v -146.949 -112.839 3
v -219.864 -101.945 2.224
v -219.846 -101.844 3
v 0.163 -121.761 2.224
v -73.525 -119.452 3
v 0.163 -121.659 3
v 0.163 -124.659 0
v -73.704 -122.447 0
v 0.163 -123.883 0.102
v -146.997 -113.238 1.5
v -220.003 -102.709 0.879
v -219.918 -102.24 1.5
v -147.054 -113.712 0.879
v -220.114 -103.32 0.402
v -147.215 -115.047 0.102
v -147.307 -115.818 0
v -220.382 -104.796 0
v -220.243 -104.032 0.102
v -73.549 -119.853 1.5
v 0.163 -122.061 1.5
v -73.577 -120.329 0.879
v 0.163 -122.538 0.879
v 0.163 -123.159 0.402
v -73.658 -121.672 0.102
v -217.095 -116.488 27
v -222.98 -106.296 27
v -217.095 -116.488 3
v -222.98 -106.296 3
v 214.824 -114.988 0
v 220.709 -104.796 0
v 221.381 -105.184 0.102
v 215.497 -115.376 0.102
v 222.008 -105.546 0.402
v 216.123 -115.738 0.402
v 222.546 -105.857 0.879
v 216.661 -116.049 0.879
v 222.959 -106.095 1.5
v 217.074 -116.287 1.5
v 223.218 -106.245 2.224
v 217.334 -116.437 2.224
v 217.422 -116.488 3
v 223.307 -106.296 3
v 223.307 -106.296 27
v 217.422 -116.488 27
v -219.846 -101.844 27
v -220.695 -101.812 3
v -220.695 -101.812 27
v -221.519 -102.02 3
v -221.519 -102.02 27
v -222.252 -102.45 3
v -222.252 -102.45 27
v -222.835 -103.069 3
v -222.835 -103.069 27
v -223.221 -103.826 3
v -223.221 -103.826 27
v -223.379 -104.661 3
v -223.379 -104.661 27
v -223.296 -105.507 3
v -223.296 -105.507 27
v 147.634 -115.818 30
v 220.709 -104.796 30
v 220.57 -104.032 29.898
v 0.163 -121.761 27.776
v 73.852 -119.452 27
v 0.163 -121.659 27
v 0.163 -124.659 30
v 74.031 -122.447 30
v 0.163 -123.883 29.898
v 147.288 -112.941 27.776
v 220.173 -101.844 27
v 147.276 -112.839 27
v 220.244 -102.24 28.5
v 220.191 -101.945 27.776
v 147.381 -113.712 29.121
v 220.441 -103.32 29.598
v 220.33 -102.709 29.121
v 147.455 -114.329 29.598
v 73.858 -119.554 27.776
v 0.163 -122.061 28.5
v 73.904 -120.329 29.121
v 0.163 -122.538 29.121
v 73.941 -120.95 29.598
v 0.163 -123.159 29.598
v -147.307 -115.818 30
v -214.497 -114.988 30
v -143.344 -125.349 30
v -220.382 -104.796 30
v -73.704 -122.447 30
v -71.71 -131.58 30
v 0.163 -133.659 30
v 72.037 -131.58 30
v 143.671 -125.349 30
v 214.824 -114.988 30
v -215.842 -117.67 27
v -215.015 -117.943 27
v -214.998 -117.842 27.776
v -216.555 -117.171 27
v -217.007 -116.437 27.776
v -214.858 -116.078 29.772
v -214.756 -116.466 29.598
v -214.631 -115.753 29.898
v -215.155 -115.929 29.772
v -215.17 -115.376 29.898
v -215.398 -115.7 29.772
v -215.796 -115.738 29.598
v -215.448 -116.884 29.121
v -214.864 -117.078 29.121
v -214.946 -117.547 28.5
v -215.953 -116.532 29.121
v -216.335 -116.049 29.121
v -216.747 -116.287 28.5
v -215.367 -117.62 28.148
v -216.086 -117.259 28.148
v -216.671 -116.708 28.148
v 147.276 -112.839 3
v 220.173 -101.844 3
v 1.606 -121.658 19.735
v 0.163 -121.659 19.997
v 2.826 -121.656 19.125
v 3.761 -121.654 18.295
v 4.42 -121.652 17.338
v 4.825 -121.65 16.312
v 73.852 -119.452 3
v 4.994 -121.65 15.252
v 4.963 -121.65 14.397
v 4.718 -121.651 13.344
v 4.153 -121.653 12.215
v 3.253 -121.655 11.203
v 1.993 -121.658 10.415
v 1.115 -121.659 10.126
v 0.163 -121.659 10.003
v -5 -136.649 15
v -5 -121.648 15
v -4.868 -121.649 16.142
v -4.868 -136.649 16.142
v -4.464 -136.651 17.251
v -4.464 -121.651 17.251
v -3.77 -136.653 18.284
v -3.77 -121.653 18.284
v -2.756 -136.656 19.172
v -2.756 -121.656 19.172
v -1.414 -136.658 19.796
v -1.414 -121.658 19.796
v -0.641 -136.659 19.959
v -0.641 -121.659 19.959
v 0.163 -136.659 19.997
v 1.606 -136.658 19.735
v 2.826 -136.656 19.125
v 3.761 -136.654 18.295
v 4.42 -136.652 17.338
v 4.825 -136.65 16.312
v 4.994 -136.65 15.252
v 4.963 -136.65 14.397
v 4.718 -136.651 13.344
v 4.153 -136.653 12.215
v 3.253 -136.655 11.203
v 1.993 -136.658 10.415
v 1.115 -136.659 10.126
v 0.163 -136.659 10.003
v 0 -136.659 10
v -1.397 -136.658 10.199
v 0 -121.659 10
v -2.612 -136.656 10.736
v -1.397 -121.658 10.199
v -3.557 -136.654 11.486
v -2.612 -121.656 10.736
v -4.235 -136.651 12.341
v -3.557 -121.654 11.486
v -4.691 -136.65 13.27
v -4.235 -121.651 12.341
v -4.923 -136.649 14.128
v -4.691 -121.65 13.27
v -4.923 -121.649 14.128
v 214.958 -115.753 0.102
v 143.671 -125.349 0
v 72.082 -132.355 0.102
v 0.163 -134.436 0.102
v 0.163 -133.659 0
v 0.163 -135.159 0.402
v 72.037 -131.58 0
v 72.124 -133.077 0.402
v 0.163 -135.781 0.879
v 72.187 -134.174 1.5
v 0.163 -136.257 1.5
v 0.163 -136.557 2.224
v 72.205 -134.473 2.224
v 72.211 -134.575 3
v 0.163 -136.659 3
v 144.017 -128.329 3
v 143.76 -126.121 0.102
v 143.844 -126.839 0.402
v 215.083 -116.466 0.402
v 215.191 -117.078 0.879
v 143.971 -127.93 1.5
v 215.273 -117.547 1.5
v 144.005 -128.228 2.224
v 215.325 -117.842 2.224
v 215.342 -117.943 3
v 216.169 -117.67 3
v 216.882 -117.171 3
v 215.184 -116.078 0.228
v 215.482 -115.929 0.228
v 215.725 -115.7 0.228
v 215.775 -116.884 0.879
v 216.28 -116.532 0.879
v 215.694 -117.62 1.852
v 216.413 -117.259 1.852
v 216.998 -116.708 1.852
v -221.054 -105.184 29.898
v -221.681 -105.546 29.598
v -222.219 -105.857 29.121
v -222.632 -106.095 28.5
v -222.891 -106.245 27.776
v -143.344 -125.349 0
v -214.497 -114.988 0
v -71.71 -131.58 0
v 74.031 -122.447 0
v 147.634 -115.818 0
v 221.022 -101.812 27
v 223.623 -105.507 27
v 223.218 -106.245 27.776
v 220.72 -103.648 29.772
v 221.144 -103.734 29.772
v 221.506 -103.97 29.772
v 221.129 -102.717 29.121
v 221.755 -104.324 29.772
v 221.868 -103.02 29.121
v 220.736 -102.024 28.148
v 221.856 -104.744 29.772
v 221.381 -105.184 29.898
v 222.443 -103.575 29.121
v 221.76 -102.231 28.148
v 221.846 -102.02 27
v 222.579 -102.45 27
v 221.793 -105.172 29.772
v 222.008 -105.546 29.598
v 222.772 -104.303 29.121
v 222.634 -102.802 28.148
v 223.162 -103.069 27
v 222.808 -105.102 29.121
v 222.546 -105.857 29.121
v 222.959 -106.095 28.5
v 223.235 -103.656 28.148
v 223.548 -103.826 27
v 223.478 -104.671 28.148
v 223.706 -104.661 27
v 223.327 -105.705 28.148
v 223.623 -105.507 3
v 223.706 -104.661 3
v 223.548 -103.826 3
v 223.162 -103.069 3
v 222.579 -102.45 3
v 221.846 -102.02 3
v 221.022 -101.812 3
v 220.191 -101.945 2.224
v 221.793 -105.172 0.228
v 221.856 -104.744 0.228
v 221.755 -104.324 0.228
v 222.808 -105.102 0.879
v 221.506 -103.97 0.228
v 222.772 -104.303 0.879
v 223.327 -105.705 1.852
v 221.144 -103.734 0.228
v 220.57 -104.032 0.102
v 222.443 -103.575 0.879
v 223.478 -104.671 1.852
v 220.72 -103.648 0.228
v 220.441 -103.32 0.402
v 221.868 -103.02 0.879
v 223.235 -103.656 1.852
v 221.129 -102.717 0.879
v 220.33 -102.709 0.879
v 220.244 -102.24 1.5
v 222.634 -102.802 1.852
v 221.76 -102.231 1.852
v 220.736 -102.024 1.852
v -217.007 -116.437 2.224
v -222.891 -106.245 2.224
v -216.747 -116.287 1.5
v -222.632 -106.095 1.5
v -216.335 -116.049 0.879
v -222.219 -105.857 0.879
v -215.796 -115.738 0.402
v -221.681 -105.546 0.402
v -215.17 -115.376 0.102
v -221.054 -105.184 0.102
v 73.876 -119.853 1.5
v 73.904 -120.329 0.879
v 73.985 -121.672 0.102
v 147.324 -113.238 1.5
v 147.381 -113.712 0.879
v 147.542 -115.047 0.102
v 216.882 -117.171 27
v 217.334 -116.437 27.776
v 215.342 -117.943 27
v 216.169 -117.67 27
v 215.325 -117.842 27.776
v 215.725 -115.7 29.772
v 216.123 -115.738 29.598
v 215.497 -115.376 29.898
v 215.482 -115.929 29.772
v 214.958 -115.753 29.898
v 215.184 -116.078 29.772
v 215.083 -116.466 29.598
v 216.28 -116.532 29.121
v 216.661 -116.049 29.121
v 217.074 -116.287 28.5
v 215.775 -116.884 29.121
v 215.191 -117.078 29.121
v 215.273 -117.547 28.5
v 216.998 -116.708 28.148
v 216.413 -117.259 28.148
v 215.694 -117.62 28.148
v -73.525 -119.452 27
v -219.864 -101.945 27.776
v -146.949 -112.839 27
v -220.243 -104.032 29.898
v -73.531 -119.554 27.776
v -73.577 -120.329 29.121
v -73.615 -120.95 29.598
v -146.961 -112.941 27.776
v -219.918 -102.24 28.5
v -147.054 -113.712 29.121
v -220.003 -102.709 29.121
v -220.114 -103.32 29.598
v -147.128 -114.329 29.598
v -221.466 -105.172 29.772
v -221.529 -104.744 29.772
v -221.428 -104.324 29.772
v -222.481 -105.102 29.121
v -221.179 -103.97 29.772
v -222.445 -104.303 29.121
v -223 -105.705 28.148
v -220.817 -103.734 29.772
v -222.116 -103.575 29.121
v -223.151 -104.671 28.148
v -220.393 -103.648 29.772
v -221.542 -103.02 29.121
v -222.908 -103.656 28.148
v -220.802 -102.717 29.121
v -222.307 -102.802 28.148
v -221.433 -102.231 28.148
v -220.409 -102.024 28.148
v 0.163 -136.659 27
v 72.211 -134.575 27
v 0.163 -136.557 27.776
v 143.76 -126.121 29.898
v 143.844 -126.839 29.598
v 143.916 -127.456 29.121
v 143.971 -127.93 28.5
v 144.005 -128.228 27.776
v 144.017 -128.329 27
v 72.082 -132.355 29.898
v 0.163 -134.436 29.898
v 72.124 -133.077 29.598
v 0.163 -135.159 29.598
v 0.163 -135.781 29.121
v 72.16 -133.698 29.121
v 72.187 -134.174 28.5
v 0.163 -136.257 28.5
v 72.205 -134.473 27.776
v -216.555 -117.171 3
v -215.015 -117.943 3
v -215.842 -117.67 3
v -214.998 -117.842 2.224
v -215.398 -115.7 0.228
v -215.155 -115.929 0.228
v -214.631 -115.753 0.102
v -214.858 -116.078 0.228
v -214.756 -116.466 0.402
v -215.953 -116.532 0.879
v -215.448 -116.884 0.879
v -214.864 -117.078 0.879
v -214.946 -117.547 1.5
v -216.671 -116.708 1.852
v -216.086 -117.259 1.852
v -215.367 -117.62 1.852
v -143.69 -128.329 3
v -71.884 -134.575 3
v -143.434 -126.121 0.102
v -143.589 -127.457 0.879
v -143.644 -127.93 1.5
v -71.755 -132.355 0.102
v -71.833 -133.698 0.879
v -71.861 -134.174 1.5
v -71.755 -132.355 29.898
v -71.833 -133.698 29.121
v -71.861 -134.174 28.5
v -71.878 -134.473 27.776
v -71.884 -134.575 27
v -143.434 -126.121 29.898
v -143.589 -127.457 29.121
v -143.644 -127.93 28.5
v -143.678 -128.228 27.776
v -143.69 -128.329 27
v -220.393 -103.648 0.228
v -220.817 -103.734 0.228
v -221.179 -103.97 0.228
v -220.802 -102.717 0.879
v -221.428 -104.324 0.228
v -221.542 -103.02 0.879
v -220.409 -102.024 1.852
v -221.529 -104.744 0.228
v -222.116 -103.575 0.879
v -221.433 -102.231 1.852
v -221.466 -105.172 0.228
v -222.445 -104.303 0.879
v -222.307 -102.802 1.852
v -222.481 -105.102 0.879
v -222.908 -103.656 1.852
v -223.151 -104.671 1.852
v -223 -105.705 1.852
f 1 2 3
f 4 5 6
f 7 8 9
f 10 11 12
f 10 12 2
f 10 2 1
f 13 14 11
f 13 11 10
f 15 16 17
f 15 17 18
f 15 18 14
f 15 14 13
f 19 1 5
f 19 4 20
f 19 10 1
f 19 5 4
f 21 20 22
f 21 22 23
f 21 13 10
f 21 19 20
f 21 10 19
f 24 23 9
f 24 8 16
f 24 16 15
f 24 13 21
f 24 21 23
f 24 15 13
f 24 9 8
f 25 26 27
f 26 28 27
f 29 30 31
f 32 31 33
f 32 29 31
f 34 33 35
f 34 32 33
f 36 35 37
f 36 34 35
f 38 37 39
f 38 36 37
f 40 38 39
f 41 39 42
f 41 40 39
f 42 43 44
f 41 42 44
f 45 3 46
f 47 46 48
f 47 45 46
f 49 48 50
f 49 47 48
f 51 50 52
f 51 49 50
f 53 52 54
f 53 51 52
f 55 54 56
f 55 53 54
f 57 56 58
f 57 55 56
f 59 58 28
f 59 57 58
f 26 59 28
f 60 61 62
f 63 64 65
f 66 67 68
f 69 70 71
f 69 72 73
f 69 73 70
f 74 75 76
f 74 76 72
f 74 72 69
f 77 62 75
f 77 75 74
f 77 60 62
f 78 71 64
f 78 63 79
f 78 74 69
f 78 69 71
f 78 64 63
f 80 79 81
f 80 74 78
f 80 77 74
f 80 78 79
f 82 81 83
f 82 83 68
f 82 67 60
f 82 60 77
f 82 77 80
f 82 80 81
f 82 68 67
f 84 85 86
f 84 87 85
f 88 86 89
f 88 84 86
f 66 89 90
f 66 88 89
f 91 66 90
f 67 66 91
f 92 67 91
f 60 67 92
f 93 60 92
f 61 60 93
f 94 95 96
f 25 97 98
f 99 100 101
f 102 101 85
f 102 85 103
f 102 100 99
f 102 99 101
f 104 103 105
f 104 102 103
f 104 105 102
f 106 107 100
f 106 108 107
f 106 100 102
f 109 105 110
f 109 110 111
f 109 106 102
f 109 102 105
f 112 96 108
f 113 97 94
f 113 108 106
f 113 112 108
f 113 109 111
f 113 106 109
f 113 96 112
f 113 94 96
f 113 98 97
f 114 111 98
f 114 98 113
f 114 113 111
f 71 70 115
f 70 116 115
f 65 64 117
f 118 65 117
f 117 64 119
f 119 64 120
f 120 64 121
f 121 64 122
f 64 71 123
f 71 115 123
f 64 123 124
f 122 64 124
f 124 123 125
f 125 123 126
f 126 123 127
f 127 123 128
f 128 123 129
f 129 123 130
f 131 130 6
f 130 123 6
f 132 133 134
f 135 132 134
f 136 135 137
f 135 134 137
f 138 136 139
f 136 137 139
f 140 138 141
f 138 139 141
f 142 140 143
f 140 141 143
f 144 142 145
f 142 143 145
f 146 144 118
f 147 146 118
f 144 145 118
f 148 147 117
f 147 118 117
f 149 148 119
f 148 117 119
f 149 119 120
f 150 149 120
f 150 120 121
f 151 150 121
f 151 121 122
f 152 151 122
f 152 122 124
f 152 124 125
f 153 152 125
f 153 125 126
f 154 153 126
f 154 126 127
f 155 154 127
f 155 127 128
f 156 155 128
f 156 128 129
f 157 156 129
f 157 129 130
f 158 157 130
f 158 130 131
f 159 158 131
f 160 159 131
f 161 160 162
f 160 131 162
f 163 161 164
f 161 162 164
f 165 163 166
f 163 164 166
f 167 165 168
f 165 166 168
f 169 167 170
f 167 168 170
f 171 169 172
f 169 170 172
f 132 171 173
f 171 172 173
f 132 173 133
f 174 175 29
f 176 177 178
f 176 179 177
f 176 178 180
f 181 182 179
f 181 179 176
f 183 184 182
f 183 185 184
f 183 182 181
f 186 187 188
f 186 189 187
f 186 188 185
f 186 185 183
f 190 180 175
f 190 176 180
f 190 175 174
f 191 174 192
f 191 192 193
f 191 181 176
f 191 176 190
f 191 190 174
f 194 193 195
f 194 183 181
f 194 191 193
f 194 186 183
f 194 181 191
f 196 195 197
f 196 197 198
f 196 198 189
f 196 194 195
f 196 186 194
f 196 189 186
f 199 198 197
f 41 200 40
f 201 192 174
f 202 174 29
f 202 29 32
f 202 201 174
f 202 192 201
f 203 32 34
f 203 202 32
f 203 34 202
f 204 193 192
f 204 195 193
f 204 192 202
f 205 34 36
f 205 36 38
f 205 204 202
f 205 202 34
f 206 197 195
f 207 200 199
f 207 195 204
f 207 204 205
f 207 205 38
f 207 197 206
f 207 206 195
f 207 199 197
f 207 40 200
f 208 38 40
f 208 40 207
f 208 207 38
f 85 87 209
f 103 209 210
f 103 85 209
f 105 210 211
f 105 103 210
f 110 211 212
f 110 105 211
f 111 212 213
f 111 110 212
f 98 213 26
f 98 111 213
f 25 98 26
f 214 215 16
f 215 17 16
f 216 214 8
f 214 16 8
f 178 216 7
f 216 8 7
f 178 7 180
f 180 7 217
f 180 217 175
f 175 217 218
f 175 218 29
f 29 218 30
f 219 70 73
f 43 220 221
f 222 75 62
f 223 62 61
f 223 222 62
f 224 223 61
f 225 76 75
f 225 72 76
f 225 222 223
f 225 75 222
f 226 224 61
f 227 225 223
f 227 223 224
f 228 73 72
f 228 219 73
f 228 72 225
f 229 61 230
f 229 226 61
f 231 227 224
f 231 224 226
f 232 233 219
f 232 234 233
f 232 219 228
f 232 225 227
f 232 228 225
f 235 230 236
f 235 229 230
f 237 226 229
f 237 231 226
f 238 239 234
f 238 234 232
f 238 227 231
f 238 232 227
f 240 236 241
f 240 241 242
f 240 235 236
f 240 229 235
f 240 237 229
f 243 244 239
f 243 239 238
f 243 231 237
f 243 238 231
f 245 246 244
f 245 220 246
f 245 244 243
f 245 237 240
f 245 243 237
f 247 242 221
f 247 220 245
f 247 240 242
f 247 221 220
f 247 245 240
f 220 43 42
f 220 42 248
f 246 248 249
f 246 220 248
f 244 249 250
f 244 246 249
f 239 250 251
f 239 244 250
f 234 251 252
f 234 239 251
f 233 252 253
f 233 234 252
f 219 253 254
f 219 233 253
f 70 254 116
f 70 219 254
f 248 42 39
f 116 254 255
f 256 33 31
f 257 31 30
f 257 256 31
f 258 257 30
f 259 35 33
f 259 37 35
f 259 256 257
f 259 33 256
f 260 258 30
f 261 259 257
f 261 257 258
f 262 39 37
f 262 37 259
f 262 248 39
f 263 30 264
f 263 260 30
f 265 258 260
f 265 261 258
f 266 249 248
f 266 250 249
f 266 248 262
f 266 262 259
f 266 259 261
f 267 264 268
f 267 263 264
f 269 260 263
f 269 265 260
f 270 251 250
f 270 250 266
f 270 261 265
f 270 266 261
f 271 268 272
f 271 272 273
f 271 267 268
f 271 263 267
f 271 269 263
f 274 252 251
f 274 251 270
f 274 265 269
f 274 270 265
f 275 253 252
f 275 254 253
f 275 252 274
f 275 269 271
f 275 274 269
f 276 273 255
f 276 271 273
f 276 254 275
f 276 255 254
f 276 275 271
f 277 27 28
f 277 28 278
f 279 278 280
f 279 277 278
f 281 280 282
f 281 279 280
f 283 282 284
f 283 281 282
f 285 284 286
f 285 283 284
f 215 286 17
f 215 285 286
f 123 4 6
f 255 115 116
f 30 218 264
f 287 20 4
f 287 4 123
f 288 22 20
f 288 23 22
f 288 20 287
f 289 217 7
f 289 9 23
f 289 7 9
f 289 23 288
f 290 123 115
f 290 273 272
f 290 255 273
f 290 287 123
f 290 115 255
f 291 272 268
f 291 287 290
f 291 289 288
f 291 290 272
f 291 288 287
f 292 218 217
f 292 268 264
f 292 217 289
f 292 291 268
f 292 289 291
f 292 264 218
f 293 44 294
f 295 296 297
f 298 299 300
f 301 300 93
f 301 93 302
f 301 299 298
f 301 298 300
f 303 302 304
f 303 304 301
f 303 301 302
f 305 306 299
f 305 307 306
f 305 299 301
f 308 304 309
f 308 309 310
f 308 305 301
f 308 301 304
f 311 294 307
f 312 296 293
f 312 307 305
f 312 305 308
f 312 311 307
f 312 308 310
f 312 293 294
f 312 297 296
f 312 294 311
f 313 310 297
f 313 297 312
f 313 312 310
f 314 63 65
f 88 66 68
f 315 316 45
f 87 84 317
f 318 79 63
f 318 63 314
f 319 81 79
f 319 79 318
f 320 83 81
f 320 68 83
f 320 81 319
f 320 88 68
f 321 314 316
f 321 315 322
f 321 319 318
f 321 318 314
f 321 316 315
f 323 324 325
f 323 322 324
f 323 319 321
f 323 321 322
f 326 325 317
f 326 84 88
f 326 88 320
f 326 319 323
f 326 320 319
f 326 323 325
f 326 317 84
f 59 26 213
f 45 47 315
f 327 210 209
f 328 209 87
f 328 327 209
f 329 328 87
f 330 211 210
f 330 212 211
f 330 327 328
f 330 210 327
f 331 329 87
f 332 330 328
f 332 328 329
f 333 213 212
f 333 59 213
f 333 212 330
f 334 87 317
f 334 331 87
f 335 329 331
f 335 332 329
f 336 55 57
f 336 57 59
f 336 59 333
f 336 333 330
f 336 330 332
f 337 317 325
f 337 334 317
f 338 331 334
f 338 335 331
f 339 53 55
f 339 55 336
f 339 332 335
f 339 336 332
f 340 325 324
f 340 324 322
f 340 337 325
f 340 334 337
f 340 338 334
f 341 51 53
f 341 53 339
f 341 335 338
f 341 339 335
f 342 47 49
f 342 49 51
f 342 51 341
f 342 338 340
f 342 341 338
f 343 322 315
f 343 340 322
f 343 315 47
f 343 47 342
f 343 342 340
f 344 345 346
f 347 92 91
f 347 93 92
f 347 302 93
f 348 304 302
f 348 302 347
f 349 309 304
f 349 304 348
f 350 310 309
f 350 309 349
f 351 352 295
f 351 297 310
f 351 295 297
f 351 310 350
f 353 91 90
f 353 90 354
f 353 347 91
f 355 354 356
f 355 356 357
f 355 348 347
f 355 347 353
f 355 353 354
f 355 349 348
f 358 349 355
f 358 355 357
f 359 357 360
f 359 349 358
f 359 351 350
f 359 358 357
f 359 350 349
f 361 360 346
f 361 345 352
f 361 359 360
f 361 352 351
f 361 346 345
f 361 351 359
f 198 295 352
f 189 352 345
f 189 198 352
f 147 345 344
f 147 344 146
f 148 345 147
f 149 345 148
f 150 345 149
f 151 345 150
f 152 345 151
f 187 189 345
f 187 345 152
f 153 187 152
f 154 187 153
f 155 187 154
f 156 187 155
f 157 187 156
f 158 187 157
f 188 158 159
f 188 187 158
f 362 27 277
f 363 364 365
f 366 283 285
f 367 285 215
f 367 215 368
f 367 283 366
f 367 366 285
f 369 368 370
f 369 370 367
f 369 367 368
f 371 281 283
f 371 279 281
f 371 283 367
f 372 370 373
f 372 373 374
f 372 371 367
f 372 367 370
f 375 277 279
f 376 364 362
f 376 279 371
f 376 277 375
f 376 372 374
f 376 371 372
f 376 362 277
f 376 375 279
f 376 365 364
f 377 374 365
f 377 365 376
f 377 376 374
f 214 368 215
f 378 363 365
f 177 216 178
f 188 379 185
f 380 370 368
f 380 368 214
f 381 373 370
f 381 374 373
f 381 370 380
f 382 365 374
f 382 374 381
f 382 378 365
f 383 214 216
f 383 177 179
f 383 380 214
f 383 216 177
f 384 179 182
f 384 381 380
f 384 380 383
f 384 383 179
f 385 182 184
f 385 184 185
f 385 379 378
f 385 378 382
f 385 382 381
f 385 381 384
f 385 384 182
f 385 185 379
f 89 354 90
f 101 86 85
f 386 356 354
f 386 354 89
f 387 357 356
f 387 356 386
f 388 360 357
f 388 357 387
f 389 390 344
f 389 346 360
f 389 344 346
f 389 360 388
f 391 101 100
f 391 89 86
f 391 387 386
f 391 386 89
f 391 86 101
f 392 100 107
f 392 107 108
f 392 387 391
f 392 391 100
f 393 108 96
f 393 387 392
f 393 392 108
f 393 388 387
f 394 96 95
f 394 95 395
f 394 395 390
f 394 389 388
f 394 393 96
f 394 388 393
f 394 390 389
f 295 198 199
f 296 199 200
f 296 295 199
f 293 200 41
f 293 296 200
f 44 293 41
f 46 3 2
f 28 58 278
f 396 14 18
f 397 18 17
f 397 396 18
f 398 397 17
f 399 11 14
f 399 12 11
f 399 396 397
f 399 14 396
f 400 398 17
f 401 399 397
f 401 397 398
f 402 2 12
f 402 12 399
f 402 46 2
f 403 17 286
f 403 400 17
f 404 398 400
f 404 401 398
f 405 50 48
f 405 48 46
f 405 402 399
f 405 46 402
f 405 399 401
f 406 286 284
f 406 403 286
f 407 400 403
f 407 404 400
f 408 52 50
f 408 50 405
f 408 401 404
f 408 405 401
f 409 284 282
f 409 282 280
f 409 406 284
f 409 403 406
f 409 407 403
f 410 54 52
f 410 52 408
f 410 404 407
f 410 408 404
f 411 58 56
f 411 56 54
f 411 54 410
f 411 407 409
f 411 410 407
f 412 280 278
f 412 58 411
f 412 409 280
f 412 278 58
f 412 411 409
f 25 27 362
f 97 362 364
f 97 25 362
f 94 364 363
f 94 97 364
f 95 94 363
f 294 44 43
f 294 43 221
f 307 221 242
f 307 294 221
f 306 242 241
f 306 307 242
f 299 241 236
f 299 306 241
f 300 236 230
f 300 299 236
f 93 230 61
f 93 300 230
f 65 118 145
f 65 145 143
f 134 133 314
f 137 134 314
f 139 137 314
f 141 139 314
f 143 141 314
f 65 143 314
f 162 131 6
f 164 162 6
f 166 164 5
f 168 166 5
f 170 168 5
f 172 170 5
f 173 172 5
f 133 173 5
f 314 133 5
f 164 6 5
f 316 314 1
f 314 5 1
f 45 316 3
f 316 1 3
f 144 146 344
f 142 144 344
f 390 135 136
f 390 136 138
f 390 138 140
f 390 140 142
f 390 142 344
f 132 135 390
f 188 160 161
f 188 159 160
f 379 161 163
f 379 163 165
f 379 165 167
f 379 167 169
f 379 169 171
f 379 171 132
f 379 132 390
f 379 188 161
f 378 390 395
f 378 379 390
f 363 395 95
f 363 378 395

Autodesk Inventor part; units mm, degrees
ref_plane "YZ Plane" through (0, 0, 0) normal (1, 0, 0) x (0, 1, 0)
ref_plane "XZ Plane" through (0, 0, 0) normal (0, 1, 0) x (-1, 0, 0)
ref_plane "XY Plane" through (0, 0, 0) normal (0, 0, 1) x (1, 0, 0)
sketch "Sketch1" plane through (0, 0, 0) normal (0, 0, 1) x (1, 0, 0)
  arc A0 (0.1634, -121.6592) -> (226.5563, -100.6675) centre (0.1634, 1109.6463) ccw
  arc A1 (0.1634, -136.6592) -> (216.7225, -117.7003) centre (0.1634, 1109.6463) ccw
  line L0 (226.5563, -100.6675) -> (216.7225, -117.7003)
  line L1 (226.5563, -100.6675) -> (246.2241, -100.6675) construction
  line L2 (0.1634, -136.6592) -> (0.1634, -109.1839)
  arc A2 (-226.2295, -100.6675) -> (0.1634, -121.6592) centre (0.1634, 1109.6463) ccw
  arc A3 (-216.3956, -117.7003) -> (0.1634, -136.6592) centre (0.1634, 1109.6463) ccw
  line L3 (-226.2295, -100.6675) -> (-216.3956, -117.7003)
  point P0 (0, 0)
  point P1 (171.9535, -124.7627)
  dimension "d0" = 15
  dimension "d1" = 120
extrude "Extrusion1" add sketch "Sketch1" along normal blind 30
fillet "Fillet1" radius 3 12 edges at (-113.5186, -116.4001, 30) (108.8571, -131.9105, 30) (221.6394, -109.1839, 30) (216.7225, -117.7003, 15) (226.5563, -100.6675, 15) (221.6394, -109.1839, 0) (113.8455, -116.4001, 0) (-221.3125, -109.1839, 30) (-226.2295, -100.6675, 15) (108.8571, -131.9105, 0) (-216.3956, -117.7003, 15) (-221.3125, -109.1839, 0)
sketch "Sketch2" plane through (0, 0, 0) normal (0, 1, 0) x (-1, 0, 0)
  line L0 (0, 0) -> (0, 15)
  circle A0 centre (0, 15) radius 5
  dimension "d5" = 15
  dimension "d6" = 10
extrude "Extrusion2" cut sketch "Sketch2" against normal blind 300
properties part number "LEAF 5" material "Steel, Carbon"
